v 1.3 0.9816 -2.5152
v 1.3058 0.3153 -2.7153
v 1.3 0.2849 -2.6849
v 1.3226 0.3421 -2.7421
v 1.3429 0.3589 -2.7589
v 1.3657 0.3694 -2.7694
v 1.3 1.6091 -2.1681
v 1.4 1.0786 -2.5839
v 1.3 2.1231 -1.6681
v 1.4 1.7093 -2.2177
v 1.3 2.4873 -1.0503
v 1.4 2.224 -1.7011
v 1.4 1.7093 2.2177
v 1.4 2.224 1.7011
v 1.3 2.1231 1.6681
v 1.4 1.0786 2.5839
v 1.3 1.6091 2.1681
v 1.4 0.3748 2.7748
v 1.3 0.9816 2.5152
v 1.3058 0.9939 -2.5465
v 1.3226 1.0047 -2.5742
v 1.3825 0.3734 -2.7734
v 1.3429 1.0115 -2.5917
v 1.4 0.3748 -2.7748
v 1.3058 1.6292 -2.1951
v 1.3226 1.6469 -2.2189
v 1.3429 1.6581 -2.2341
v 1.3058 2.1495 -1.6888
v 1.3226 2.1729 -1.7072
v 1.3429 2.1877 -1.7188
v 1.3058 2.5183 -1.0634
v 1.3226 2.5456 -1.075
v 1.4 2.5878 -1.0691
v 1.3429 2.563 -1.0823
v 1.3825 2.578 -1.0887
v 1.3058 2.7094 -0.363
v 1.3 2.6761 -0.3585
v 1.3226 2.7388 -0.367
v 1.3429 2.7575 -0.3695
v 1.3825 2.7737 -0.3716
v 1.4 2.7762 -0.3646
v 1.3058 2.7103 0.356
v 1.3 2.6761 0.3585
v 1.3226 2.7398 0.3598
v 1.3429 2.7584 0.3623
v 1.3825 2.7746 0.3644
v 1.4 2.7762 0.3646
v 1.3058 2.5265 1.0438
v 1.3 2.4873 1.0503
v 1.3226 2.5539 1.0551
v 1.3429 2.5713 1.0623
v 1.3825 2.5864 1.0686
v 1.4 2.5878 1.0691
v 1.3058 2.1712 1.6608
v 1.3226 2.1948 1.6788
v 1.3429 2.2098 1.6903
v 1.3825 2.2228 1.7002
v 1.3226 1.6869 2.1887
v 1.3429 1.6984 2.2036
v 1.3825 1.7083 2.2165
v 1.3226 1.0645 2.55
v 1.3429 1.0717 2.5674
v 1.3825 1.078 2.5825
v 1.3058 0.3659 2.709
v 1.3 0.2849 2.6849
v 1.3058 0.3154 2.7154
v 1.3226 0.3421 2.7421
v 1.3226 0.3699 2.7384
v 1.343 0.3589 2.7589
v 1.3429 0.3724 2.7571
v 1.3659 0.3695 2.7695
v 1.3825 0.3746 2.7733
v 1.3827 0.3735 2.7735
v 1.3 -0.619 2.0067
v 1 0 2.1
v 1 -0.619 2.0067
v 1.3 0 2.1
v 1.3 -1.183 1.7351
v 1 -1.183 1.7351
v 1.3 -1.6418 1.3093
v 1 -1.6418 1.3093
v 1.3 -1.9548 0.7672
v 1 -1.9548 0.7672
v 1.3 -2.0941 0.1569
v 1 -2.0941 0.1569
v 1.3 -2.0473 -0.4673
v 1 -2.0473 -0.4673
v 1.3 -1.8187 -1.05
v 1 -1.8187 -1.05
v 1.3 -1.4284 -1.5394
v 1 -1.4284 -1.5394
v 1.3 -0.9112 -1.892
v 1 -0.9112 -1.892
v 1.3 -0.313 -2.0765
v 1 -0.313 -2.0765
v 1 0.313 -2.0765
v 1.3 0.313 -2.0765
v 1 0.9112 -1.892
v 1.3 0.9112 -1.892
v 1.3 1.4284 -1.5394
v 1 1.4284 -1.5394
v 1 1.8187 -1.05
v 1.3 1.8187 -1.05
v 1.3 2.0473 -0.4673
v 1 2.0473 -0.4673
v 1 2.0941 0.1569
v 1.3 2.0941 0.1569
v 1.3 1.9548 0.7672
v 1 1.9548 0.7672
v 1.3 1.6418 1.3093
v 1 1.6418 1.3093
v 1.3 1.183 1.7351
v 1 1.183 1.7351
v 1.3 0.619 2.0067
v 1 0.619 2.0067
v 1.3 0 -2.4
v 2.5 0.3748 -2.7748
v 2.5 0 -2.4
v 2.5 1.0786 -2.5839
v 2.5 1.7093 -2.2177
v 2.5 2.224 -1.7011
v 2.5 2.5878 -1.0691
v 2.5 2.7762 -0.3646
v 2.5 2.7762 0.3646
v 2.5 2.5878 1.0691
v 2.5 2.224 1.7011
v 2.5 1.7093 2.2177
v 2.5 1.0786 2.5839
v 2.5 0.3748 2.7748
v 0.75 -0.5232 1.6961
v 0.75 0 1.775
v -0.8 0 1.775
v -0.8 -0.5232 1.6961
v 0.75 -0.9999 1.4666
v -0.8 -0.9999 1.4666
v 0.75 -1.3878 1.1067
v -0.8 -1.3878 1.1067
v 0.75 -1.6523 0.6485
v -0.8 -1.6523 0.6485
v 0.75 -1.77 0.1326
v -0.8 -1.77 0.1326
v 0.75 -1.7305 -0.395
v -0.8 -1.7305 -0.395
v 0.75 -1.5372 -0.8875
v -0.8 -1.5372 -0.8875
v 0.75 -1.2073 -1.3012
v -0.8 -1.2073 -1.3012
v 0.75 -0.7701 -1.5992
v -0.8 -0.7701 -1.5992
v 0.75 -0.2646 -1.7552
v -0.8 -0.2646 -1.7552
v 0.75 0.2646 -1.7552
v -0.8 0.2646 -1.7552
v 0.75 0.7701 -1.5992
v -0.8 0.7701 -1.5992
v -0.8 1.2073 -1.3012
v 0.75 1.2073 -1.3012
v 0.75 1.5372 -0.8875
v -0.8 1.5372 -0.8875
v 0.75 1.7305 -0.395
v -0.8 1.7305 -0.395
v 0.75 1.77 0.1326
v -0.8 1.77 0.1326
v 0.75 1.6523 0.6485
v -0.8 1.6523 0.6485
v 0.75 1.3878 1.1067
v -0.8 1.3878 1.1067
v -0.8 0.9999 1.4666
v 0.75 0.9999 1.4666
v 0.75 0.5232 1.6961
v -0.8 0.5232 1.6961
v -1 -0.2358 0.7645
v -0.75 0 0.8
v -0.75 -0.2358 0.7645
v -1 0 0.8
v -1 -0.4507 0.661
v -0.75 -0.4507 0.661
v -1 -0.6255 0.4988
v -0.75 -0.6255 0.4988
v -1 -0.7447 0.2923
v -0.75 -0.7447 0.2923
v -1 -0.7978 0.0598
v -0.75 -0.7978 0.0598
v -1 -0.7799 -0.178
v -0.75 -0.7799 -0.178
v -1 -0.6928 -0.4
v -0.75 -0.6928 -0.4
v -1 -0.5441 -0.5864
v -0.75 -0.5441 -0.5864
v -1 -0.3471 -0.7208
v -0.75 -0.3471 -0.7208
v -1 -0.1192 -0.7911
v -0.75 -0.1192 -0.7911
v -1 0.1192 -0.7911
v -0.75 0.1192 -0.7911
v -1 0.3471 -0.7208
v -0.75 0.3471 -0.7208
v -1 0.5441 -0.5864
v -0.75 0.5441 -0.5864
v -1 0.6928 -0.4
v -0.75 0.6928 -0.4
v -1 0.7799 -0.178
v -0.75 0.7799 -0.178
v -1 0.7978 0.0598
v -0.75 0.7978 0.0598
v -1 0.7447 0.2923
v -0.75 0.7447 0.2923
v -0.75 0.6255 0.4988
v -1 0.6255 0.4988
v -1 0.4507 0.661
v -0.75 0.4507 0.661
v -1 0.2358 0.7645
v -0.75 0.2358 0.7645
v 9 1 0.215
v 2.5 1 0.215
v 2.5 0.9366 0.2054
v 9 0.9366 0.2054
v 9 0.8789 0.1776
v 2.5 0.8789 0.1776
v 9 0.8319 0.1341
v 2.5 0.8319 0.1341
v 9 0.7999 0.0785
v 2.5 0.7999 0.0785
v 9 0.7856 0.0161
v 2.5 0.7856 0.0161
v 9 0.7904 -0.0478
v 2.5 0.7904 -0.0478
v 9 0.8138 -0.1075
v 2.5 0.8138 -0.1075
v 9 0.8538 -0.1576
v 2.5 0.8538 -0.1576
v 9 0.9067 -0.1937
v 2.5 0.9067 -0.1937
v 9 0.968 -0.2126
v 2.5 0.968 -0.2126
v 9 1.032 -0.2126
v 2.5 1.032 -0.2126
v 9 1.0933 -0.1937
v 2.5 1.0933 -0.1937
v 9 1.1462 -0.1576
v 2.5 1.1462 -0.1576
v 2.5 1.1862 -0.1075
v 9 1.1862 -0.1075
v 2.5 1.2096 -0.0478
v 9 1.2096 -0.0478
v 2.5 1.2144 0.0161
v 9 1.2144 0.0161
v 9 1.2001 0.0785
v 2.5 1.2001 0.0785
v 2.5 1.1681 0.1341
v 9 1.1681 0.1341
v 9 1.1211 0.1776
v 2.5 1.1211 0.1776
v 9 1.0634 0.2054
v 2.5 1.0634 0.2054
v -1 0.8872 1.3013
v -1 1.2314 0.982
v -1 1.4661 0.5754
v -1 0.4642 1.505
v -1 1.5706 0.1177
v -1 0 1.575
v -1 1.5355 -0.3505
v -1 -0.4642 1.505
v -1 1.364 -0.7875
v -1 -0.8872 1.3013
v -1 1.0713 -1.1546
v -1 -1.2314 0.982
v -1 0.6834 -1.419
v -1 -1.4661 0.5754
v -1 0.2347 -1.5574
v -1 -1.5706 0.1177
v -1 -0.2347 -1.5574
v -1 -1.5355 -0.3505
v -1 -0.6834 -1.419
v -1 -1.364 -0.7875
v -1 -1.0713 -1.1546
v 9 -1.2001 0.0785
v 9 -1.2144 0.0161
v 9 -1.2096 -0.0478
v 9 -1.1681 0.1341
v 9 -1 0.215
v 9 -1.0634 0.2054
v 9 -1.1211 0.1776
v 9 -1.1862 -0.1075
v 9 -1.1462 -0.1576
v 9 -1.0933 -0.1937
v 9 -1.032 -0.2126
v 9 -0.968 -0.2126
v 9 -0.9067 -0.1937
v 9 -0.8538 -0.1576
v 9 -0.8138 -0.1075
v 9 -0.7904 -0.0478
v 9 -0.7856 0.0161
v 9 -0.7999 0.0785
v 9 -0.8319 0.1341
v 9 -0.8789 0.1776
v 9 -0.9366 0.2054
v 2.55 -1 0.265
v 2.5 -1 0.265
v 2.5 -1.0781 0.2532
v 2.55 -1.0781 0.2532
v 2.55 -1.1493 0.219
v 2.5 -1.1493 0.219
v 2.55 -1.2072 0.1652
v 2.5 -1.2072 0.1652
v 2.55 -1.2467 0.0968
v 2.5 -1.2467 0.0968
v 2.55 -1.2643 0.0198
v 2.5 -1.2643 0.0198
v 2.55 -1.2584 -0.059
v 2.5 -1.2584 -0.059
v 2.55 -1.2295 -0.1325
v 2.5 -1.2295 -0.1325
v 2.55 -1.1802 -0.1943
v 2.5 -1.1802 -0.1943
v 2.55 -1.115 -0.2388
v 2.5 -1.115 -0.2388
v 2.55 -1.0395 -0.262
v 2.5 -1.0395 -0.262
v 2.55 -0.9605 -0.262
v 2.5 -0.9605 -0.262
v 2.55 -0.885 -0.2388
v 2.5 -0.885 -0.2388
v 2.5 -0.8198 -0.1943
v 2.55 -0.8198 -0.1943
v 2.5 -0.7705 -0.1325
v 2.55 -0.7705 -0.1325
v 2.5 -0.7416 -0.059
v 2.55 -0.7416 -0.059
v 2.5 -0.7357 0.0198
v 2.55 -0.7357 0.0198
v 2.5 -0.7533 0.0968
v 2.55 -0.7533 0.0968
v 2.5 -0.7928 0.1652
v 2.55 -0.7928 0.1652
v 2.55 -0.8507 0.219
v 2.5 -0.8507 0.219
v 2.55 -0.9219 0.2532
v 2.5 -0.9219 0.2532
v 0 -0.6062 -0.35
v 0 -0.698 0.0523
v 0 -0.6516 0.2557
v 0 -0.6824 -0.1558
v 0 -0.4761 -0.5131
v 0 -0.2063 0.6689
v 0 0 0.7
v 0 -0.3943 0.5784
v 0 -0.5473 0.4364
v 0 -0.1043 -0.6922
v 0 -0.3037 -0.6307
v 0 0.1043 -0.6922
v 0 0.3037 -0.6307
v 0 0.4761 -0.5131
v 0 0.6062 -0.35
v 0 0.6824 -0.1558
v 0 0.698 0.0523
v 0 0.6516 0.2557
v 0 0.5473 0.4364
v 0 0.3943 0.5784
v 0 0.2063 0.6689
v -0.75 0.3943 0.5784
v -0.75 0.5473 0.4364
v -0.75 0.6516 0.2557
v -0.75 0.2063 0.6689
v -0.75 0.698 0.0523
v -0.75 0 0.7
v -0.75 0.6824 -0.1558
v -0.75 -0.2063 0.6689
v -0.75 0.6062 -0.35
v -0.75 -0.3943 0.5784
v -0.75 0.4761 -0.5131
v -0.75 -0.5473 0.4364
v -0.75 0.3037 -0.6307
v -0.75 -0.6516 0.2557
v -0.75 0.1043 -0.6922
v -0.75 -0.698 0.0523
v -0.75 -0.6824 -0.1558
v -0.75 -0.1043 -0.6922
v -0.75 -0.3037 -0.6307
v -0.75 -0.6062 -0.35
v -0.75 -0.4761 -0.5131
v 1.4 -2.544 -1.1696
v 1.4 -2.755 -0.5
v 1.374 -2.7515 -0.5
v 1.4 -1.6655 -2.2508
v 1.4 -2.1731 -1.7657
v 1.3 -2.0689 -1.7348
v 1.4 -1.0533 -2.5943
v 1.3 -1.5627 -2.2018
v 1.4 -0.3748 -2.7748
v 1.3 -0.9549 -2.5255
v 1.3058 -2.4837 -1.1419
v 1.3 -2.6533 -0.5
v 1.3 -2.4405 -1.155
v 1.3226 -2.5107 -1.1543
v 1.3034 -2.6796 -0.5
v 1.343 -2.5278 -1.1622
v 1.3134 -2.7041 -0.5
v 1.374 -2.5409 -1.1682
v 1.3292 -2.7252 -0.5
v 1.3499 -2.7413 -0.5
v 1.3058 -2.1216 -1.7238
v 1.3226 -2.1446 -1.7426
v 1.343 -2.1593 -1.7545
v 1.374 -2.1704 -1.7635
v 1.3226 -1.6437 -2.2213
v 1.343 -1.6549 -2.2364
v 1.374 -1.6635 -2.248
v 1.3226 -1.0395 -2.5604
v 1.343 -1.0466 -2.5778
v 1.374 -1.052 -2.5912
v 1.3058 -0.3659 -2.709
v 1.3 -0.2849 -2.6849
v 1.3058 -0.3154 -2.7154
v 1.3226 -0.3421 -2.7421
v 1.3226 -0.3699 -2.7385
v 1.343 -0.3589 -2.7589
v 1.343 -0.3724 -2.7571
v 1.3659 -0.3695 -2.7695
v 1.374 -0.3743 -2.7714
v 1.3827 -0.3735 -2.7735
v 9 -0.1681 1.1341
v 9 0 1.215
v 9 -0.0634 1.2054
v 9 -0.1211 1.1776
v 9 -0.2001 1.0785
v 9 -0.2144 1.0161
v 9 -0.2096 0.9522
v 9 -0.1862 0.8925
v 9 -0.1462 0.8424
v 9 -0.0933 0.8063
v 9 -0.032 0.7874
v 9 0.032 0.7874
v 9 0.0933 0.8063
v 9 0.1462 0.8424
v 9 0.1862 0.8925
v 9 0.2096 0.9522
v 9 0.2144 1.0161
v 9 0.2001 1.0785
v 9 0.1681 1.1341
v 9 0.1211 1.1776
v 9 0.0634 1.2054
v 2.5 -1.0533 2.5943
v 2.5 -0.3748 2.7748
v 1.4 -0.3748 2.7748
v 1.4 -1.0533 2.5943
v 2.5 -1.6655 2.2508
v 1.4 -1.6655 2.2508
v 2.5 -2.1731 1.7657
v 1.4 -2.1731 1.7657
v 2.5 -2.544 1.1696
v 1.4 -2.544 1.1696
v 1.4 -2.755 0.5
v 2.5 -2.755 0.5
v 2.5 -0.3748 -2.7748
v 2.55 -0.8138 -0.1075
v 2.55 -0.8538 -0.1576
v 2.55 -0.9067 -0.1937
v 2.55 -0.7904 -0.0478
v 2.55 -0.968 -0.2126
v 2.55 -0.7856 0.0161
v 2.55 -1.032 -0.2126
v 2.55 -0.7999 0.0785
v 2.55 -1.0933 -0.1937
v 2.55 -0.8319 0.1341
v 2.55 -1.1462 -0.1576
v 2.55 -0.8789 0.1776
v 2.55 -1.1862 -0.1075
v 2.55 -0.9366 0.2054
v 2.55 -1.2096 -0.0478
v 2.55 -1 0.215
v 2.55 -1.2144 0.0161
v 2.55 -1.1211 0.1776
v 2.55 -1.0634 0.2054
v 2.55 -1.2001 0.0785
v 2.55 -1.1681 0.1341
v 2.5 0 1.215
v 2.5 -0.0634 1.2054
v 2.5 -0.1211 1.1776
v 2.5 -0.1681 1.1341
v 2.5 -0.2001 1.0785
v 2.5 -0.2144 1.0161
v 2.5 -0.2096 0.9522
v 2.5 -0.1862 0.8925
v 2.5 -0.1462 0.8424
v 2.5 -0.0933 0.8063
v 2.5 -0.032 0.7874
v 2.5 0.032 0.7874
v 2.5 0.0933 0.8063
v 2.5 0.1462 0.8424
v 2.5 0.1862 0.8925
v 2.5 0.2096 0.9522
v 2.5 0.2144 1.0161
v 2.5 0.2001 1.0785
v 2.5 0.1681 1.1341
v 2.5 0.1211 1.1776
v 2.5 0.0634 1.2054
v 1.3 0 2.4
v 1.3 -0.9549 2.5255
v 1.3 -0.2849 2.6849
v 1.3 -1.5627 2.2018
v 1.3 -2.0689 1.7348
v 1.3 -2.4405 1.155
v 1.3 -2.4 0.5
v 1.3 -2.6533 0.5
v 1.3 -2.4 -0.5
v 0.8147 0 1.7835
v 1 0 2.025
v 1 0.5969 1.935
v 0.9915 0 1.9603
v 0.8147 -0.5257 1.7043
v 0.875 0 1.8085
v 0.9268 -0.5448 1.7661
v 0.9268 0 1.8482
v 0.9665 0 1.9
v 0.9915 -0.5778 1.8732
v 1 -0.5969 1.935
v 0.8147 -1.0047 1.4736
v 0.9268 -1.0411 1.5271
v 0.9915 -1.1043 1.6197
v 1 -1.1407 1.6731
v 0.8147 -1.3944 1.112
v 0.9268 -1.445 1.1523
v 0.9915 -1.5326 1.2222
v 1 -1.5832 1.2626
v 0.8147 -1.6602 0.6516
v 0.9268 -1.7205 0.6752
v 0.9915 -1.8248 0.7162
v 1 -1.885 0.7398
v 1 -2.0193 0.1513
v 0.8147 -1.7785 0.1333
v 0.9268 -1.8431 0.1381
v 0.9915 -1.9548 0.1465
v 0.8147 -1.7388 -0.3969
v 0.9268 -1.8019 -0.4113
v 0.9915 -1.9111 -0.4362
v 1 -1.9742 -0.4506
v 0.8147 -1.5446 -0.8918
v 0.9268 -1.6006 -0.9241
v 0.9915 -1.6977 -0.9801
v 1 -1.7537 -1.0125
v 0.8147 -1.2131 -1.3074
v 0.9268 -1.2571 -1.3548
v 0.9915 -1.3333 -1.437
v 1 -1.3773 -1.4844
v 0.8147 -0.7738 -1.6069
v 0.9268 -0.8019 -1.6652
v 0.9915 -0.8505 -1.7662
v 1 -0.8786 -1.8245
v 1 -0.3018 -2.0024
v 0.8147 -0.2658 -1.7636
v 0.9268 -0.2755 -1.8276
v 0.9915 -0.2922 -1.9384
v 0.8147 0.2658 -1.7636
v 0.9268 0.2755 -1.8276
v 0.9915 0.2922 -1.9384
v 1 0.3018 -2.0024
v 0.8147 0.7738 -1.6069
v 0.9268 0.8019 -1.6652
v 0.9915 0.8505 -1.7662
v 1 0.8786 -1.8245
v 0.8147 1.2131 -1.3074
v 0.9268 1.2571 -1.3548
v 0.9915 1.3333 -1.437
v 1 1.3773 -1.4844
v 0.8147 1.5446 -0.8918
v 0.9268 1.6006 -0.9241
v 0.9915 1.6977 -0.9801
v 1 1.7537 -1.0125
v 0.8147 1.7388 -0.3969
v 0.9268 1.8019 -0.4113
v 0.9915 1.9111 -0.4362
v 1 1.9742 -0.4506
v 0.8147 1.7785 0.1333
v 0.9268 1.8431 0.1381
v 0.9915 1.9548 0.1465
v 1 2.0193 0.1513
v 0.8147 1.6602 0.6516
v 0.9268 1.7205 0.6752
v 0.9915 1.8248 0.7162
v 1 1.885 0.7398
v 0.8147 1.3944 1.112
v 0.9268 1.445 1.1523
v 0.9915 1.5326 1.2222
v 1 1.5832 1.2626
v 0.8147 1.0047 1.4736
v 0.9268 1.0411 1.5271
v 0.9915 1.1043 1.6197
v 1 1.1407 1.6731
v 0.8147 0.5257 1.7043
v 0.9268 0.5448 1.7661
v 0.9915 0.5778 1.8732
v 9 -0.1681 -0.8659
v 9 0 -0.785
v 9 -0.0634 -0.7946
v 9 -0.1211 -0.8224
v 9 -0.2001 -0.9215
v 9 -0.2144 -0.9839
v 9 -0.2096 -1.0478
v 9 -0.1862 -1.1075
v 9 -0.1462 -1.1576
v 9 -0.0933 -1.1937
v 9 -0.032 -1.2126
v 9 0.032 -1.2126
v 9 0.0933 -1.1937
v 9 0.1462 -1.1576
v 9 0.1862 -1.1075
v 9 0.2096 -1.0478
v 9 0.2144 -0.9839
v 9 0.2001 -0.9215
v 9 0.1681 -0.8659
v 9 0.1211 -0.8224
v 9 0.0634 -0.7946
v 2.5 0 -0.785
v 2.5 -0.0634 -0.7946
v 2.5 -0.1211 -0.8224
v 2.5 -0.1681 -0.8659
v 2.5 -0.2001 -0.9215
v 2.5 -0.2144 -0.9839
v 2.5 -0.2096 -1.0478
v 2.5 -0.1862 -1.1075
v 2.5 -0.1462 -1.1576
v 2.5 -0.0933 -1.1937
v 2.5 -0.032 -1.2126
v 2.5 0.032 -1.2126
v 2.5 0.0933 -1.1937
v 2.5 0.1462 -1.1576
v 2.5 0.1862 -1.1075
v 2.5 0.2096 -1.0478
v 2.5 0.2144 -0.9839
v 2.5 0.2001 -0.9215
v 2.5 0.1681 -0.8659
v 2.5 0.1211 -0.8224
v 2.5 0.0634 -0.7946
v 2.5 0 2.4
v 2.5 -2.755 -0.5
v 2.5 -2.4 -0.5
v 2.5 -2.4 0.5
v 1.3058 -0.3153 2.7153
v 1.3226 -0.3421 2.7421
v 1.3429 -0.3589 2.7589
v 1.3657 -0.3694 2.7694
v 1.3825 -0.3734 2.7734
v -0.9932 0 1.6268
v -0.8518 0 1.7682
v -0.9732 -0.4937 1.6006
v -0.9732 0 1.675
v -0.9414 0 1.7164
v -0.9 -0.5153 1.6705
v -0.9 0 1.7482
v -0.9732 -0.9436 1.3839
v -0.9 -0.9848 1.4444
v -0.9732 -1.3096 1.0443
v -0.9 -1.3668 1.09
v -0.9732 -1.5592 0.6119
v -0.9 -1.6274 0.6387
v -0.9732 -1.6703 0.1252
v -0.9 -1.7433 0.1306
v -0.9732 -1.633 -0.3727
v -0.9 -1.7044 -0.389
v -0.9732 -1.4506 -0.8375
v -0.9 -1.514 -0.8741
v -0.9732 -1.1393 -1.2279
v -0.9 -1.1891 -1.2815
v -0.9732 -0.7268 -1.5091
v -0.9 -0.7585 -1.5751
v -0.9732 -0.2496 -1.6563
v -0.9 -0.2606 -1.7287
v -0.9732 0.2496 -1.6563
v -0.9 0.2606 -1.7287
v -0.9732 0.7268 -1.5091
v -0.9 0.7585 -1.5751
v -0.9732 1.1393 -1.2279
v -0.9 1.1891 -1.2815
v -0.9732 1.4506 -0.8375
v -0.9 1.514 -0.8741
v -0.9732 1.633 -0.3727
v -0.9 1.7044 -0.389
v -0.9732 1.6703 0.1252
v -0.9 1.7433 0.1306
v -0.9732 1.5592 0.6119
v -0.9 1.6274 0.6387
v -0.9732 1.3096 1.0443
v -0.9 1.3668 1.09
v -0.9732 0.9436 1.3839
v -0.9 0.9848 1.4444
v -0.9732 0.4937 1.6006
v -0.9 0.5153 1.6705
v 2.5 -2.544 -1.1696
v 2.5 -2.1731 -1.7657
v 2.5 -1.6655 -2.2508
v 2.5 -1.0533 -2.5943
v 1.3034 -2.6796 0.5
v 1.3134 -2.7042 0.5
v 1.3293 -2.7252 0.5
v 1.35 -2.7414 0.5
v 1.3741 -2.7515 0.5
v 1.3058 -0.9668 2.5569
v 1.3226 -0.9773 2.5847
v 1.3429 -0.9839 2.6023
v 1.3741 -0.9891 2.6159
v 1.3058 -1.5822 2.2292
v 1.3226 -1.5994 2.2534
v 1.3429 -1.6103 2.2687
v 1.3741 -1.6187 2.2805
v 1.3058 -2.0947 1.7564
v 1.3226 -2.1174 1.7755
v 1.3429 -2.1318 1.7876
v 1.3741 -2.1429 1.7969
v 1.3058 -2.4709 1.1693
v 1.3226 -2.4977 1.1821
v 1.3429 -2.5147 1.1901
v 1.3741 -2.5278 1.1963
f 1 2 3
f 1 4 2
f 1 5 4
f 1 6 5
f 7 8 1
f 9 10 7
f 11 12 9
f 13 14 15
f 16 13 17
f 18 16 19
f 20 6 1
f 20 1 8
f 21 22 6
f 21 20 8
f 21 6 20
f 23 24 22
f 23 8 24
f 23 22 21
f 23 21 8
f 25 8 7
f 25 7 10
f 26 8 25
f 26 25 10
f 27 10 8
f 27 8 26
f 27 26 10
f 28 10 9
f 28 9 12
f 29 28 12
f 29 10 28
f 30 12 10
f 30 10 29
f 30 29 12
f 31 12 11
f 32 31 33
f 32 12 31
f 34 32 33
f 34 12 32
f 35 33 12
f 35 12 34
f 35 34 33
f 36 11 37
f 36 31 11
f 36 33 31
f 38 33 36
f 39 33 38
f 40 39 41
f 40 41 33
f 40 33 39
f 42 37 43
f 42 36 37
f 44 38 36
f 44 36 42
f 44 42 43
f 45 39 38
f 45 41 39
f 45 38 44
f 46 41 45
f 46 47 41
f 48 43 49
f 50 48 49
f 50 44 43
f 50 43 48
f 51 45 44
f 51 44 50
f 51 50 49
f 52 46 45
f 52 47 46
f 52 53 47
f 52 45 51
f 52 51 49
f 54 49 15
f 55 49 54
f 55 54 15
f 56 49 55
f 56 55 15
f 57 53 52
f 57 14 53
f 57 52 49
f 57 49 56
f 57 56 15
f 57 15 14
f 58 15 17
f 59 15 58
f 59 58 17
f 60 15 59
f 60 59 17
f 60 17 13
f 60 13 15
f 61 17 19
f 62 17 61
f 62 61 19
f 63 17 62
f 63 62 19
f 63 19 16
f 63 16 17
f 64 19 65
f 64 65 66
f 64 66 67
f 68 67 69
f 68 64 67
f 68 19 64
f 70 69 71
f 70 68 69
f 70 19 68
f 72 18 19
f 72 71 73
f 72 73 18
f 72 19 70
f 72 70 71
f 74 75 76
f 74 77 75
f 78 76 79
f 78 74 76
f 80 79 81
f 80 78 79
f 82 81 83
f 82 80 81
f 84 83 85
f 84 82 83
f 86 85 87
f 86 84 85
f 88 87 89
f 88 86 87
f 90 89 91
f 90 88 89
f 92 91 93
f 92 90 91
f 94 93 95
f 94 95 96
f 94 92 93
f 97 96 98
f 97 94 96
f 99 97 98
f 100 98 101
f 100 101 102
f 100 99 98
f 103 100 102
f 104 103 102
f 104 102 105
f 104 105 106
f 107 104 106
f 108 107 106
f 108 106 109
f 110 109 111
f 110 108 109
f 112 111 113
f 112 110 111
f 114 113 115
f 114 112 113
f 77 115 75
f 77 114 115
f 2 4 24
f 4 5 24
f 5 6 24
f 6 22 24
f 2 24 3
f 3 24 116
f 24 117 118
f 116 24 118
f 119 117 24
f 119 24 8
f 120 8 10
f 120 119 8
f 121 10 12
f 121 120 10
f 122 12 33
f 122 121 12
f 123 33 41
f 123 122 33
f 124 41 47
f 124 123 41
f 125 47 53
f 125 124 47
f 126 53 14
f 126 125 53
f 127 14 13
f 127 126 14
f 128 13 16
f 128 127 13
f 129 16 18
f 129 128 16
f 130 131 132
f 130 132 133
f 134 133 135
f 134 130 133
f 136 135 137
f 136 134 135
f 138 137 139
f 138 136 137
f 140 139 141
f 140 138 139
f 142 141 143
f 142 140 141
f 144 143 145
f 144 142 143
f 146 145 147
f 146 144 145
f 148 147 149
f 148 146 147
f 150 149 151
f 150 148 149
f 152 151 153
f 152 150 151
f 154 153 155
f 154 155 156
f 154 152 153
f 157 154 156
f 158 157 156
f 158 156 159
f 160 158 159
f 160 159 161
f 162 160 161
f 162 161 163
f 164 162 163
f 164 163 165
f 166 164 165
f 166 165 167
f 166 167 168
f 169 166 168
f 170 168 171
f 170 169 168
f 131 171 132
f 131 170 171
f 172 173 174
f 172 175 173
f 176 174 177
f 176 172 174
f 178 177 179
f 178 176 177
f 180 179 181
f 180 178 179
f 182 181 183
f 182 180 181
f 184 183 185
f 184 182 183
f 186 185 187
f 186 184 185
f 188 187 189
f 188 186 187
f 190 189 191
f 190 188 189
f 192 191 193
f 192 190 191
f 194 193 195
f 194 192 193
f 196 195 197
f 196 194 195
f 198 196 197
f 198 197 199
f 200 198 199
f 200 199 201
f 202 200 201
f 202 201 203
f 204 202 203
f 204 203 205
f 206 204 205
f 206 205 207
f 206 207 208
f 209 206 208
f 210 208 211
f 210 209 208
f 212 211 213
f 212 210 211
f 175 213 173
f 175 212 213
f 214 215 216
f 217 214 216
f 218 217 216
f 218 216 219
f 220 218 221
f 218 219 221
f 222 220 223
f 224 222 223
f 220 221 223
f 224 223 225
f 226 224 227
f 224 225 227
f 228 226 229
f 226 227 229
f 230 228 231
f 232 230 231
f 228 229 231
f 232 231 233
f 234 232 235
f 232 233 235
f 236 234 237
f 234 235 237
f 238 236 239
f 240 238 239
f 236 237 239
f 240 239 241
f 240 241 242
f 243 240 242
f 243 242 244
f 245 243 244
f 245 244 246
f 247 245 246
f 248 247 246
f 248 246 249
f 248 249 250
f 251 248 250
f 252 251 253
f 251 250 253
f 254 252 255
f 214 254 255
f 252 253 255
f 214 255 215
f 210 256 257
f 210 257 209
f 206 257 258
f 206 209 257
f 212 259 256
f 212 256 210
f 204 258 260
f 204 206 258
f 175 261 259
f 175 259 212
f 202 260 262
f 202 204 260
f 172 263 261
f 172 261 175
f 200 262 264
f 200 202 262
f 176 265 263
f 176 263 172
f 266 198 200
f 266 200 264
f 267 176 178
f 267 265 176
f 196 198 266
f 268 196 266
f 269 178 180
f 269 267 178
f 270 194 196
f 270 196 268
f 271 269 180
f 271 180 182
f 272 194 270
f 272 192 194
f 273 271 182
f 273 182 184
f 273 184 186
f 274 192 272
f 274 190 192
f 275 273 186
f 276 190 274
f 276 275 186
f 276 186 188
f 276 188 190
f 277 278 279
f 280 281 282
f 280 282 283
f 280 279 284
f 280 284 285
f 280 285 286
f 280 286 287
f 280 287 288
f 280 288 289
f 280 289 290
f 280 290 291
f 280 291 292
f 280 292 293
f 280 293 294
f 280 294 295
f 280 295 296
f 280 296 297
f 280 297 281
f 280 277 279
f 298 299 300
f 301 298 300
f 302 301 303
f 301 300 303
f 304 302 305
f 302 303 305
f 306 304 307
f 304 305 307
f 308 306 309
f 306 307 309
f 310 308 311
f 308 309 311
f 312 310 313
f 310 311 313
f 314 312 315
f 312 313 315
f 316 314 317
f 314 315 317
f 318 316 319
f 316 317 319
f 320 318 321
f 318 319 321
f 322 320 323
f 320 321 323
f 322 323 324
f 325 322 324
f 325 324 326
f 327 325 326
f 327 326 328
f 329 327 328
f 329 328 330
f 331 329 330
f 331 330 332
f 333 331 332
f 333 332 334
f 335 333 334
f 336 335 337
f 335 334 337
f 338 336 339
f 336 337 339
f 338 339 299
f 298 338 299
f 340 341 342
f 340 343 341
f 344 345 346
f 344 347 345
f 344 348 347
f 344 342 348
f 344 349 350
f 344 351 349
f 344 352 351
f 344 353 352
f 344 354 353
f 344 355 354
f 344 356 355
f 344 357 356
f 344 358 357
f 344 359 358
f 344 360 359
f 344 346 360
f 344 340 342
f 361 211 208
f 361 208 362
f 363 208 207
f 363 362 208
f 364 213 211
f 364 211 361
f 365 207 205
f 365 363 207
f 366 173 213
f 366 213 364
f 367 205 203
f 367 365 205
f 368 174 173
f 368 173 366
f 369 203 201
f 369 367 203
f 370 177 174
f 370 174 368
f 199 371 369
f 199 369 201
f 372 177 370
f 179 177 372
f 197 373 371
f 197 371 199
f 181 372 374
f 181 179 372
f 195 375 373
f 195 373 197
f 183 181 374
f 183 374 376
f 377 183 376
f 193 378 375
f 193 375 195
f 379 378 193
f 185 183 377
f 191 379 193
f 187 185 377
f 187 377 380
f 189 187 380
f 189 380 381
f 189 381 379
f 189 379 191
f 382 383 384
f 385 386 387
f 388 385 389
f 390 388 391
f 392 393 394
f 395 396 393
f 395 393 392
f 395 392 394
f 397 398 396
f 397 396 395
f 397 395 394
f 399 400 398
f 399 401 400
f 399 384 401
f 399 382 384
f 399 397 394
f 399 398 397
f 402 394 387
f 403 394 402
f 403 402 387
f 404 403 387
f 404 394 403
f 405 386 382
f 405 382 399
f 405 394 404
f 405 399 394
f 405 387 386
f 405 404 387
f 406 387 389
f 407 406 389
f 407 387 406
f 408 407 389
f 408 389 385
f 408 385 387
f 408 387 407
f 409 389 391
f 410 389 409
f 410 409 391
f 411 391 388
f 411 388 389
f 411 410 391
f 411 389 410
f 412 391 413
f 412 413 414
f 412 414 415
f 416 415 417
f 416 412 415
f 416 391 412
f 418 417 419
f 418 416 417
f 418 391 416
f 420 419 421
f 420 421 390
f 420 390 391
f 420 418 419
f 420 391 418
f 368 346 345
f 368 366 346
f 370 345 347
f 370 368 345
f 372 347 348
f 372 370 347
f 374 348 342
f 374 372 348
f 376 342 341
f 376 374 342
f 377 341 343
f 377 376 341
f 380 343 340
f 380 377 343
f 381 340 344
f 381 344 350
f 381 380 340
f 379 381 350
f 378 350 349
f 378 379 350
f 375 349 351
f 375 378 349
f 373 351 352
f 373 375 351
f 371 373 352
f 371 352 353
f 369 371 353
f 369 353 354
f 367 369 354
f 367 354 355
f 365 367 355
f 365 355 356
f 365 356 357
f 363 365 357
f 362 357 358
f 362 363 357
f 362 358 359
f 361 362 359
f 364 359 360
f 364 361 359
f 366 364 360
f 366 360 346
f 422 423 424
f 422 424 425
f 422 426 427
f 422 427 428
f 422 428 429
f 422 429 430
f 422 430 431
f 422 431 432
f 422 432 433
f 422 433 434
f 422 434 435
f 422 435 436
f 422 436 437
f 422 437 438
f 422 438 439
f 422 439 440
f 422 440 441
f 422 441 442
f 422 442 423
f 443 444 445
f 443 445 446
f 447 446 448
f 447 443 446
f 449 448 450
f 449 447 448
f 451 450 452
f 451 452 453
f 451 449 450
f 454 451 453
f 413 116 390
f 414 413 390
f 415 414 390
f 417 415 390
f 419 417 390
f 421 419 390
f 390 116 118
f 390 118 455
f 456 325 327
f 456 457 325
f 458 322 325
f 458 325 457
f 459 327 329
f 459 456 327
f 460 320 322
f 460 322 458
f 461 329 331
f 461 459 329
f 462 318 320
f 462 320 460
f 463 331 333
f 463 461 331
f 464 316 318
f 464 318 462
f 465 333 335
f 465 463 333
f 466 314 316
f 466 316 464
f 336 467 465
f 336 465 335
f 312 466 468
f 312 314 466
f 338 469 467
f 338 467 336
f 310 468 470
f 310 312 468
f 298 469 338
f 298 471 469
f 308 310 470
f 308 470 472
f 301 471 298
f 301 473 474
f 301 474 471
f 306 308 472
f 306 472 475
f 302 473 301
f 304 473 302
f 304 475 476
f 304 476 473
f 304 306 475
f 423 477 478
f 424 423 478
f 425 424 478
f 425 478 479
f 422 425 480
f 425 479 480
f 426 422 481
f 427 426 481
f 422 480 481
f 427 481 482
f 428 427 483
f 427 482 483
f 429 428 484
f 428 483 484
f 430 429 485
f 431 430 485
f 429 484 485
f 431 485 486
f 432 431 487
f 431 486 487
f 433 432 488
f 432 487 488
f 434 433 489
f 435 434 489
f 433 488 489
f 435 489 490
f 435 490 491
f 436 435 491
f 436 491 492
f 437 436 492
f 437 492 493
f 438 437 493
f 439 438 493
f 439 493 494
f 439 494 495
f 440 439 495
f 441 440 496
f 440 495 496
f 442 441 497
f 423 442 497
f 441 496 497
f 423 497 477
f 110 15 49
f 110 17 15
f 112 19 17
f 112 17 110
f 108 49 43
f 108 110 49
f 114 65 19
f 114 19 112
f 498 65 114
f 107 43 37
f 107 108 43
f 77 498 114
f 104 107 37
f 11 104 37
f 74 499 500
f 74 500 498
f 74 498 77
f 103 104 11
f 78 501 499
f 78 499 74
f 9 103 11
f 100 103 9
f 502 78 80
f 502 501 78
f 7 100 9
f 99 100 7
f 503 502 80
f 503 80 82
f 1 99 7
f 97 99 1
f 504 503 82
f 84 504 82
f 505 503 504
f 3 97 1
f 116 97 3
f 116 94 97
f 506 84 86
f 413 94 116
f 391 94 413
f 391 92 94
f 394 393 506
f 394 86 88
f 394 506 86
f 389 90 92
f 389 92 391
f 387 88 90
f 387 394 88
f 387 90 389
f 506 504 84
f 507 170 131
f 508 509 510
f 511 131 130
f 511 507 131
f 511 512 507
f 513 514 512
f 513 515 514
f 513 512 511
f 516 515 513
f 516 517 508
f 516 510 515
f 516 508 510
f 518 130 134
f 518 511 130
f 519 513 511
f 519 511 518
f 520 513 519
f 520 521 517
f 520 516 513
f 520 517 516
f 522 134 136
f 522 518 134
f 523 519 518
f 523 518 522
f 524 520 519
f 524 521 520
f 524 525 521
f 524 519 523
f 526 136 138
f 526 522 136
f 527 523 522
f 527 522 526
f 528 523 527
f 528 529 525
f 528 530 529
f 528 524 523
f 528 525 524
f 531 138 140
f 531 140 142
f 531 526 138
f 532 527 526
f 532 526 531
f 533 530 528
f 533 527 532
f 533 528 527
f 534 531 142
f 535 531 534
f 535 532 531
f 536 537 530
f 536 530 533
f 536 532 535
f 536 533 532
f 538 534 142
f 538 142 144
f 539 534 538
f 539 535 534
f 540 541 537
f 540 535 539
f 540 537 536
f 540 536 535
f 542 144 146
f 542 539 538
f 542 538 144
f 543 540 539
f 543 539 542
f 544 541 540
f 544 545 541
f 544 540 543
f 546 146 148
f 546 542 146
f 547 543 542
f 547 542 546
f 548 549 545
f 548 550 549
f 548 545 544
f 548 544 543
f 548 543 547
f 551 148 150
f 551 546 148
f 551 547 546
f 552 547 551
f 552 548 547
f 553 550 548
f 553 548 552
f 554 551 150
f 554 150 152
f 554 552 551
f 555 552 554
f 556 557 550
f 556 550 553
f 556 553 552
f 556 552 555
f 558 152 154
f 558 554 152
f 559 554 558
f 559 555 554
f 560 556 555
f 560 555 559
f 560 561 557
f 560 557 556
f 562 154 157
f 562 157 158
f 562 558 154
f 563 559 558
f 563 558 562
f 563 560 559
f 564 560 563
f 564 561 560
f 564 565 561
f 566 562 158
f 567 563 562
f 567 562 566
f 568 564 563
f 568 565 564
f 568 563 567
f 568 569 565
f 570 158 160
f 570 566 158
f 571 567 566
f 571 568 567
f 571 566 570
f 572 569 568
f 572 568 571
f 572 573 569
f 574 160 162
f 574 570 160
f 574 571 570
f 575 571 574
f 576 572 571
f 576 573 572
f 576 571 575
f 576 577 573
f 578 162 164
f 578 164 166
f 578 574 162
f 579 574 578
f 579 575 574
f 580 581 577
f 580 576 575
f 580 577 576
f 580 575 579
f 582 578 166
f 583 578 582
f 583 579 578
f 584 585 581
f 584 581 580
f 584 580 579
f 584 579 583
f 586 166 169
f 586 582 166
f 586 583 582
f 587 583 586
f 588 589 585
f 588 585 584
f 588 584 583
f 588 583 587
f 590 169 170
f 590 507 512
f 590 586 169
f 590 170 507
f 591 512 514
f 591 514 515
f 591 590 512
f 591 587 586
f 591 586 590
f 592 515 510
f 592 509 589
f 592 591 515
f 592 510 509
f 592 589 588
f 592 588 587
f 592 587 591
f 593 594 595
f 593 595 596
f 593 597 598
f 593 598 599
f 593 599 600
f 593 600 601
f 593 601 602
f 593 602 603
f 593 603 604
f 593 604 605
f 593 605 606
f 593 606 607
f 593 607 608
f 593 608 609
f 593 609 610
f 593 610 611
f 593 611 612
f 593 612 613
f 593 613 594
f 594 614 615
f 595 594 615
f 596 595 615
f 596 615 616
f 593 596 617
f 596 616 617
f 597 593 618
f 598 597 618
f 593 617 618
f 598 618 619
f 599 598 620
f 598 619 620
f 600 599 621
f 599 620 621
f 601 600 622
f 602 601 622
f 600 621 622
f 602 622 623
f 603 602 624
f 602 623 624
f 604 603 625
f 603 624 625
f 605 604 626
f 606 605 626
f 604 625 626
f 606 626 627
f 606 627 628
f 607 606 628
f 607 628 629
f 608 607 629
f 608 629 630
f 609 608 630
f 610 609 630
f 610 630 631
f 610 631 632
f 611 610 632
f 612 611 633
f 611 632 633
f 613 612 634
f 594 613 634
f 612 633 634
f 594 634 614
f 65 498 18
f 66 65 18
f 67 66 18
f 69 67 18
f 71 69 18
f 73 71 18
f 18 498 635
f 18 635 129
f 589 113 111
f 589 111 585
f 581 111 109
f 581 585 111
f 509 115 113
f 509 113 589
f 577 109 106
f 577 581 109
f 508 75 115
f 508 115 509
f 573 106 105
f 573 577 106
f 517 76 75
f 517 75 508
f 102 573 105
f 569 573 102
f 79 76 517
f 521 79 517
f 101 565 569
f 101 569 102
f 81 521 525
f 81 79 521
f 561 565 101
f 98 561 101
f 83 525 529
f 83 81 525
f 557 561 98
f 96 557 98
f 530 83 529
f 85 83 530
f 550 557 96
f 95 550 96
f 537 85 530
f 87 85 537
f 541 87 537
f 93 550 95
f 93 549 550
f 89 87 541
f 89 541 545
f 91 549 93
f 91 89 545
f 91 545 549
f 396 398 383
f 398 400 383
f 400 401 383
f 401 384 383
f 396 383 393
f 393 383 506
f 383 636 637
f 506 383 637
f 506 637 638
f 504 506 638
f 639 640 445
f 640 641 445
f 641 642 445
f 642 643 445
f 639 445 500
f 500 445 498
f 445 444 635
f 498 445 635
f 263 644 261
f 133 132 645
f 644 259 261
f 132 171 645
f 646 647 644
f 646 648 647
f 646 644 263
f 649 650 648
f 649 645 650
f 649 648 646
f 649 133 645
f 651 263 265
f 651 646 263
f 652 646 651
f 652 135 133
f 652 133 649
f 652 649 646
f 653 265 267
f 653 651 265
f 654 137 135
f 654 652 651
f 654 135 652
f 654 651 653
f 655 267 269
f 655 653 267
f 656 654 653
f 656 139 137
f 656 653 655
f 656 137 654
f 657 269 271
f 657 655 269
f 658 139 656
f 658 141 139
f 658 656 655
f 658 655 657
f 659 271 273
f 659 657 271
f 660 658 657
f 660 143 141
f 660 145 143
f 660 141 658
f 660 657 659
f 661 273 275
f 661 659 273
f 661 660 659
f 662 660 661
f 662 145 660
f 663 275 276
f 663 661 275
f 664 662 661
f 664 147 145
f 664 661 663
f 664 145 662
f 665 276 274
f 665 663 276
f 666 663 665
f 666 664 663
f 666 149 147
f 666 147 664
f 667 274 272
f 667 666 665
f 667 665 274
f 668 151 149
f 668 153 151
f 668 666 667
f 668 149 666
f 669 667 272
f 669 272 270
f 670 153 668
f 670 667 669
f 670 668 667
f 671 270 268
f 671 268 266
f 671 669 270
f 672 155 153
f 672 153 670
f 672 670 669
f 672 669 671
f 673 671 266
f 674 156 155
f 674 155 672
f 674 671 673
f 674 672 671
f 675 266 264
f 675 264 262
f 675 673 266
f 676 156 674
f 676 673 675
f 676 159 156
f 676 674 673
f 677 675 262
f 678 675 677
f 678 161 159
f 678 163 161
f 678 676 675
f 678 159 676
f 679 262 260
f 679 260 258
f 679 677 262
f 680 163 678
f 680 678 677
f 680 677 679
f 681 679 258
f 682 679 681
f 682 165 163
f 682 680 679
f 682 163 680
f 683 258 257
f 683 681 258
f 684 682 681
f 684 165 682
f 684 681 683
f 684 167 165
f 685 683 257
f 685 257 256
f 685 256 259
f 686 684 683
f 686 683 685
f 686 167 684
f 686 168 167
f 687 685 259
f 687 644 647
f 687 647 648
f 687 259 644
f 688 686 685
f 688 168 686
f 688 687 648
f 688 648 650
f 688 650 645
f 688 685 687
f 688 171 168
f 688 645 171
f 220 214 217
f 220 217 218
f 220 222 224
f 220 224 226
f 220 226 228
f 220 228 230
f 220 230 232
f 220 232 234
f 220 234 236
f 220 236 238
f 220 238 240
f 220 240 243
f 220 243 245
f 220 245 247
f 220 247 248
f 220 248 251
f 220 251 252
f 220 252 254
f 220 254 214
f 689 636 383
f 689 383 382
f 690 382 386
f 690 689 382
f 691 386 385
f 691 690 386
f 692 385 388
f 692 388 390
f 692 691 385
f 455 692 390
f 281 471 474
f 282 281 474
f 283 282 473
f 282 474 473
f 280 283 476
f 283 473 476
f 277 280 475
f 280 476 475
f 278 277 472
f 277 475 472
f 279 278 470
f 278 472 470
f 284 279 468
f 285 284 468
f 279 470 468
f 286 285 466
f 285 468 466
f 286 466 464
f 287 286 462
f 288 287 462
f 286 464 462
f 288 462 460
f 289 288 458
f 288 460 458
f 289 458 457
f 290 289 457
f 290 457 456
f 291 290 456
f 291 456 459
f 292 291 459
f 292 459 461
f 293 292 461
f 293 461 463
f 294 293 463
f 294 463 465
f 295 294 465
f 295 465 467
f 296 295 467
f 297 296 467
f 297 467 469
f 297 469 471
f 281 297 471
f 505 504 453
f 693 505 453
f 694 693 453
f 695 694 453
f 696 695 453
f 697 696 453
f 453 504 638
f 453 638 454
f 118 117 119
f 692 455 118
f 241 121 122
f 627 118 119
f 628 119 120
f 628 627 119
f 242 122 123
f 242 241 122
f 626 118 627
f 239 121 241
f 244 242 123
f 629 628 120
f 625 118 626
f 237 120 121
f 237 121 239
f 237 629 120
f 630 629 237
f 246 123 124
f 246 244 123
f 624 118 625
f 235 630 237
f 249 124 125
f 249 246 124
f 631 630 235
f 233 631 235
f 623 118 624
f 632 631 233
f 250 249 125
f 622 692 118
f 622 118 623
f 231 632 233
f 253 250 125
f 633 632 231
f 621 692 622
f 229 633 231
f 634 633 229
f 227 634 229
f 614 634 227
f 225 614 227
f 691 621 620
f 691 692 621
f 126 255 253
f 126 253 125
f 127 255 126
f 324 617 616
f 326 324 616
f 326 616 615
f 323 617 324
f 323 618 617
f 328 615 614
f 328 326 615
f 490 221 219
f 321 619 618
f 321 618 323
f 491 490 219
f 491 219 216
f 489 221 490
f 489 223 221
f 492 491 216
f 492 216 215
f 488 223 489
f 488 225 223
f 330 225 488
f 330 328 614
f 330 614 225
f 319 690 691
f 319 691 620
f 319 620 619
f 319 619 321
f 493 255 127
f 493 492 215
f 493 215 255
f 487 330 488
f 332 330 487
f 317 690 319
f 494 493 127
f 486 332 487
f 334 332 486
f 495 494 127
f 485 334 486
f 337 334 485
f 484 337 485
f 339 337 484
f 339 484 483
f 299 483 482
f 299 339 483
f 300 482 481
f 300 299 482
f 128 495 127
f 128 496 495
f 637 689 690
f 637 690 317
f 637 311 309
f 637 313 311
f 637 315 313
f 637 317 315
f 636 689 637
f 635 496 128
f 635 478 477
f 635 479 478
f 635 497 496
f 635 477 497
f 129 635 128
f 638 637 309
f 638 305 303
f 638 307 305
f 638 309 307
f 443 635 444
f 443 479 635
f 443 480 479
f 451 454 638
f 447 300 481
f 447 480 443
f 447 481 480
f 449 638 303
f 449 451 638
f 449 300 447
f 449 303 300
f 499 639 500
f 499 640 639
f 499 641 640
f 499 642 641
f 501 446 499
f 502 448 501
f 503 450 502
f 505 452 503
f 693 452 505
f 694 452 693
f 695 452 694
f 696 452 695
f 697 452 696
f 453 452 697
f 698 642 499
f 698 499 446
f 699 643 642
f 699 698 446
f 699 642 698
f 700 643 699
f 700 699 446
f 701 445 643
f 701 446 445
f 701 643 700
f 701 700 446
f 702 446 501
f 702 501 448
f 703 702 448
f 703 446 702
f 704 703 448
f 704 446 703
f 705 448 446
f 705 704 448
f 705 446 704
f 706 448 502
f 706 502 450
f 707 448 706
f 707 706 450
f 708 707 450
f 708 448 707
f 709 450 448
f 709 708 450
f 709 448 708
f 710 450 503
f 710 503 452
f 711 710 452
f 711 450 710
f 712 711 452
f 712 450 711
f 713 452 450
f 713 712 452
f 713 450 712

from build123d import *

# Parameters (mm, degrees)
SKETCH6_R           = 0.215
EXTRUDE2_DEPTH      = 6.5
CUT_EXTRUDE1_DEPTH  = 8.611175993
FILLET1_R           = 0.2
FILLET2_R           = 0.1
SKETCH6_3_R         = 0.265
SKETCH6_3_R_2       = 0.215
BOSS_EXTRUDE2_DEPTH = 0.05


with BuildPart() as part:
    # Sketch4 → Revolve2 (revolve)
    with BuildSketch(Plane.XY, mode=Mode.PRIVATE) as revolve2_sk:
        with BuildLine():
            Line((0, 0), (0, 0.7))
            Line((0, 0.7), (-0.75, 0.7))
            Line((-0.75, 0.7), (-0.75, 0.8))
            Line((-0.75, 0.8), (-1, 0.8))
            Line((-1, 0.8), (-1, 1.775))
            Line((-1, 1.775), (0.75, 1.775))
            ThreePointArc((0.75, 1.775), (0.926776695, 1.848223305), (1, 2.025))
            Line((1, 2.025), (1, 2.1))
            Line((1, 2.1), (1.3, 2.1))
            Line((1.3, 2.1), (1.3, 2.8))
            Line((1.3, 2.8), (2.5, 2.8))
            Line((2.5, 2.8), (2.5, 0))
            Line((2.5, 0), (0, 0))
        make_face()
    revolve(revolve2_sk.sketch.rotate(Axis((-2.49171246, 0, 0), (1, 0, 0)), 90), axis=Axis((-2.49171246, 0, 0), (1, 0, 0)))

    # Sketch6 → Extrude2 (add)
    with BuildSketch(Plane(origin=(2.5, 0, 0), x_dir=(0, 0, -1), z_dir=(1, 0, 0))):
        with Locations(Location((0, -1, 0), (0, 0, 180))):
            Circle(SKETCH6_R)
        with Locations(Location((-1, 0, 0), (0, 0, 180))):
            Circle(SKETCH6_R)
        with Locations(Location((1, 0, 0), (0, 0, 180))):
            Circle(SKETCH6_R)
        with Locations(Location((0, 1, 0), (0, 0, 180))):
            Circle(SKETCH6_R)
    extrude(amount=EXTRUDE2_DEPTH)

    # Sketch8 → Cut-Extrude1 (cut, through all)
    with BuildSketch(Plane(origin=(2.5, 0, 0), x_dir=(0, 0, -1), z_dir=(1, 0, 0))):
        with BuildLine():
            Line((-2.4, 0), (-2.774801575, 0.374801575))
            ThreePointArc((-2.774801575, 0.374801575), (-2.8, 0), (-2.774801575, -0.374801575))
            Line((-2.774801575, -0.374801575), (-2.4, 0))
        make_face()
        with BuildLine():
            Line((2.774801575, 0.374801575), (2.4, 0))
            Line((2.4, 0), (2.774801575, -0.374801575))
            ThreePointArc((2.774801575, -0.374801575), (2.793693291, -0.187823841), (2.8, 0))
            ThreePointArc((2.8, 0), (2.793693291, 0.187823841), (2.774801575, 0.374801575))
        make_face()
        with BuildLine():
            ThreePointArc((-0.5, -2.754995463), (0, -2.8), (0.5, -2.754995463))
            Line((0.5, -2.754995463), (0.5, -2.4))
            Line((0.5, -2.4), (-0.5, -2.4))
            Line((-0.5, -2.4), (-0.5, -2.754995463))
        make_face()
    extrude(amount=-CUT_EXTRUDE1_DEPTH, mode=Mode.SUBTRACT)

    # Fillet1
    fillet1_edges = [part.edges().sort_by_distance(p)[0] for p in [
        (-1, 0, -1.775),
    ]]
    fillet(fillet1_edges, radius=FILLET1_R)

    # Fillet2
    fillet2_edges = [part.edges().sort_by_distance(p)[0] for p in [
        (1.3, 2.8, 0),
        (1.3, -1.934576937, -2.02420653),
        (1.3, -1.934576937, 2.02420653),
    ]]
    fillet(fillet2_edges, radius=FILLET2_R)

    # Sketch6<3> → Boss-Extrude2 (add)
    with BuildSketch(Plane(origin=(2.5, 0, 0), x_dir=(0, 0, -1), z_dir=(1, 0, 0))):
        with Locations(Location((0, -1, 0), (0, 0, 180))):
            Circle(SKETCH6_3_R)
        with Locations((0, -1)):
            Circle(SKETCH6_3_R_2, mode=Mode.SUBTRACT)
    extrude(amount=BOSS_EXTRUDE2_DEPTH)


solid = part.part
